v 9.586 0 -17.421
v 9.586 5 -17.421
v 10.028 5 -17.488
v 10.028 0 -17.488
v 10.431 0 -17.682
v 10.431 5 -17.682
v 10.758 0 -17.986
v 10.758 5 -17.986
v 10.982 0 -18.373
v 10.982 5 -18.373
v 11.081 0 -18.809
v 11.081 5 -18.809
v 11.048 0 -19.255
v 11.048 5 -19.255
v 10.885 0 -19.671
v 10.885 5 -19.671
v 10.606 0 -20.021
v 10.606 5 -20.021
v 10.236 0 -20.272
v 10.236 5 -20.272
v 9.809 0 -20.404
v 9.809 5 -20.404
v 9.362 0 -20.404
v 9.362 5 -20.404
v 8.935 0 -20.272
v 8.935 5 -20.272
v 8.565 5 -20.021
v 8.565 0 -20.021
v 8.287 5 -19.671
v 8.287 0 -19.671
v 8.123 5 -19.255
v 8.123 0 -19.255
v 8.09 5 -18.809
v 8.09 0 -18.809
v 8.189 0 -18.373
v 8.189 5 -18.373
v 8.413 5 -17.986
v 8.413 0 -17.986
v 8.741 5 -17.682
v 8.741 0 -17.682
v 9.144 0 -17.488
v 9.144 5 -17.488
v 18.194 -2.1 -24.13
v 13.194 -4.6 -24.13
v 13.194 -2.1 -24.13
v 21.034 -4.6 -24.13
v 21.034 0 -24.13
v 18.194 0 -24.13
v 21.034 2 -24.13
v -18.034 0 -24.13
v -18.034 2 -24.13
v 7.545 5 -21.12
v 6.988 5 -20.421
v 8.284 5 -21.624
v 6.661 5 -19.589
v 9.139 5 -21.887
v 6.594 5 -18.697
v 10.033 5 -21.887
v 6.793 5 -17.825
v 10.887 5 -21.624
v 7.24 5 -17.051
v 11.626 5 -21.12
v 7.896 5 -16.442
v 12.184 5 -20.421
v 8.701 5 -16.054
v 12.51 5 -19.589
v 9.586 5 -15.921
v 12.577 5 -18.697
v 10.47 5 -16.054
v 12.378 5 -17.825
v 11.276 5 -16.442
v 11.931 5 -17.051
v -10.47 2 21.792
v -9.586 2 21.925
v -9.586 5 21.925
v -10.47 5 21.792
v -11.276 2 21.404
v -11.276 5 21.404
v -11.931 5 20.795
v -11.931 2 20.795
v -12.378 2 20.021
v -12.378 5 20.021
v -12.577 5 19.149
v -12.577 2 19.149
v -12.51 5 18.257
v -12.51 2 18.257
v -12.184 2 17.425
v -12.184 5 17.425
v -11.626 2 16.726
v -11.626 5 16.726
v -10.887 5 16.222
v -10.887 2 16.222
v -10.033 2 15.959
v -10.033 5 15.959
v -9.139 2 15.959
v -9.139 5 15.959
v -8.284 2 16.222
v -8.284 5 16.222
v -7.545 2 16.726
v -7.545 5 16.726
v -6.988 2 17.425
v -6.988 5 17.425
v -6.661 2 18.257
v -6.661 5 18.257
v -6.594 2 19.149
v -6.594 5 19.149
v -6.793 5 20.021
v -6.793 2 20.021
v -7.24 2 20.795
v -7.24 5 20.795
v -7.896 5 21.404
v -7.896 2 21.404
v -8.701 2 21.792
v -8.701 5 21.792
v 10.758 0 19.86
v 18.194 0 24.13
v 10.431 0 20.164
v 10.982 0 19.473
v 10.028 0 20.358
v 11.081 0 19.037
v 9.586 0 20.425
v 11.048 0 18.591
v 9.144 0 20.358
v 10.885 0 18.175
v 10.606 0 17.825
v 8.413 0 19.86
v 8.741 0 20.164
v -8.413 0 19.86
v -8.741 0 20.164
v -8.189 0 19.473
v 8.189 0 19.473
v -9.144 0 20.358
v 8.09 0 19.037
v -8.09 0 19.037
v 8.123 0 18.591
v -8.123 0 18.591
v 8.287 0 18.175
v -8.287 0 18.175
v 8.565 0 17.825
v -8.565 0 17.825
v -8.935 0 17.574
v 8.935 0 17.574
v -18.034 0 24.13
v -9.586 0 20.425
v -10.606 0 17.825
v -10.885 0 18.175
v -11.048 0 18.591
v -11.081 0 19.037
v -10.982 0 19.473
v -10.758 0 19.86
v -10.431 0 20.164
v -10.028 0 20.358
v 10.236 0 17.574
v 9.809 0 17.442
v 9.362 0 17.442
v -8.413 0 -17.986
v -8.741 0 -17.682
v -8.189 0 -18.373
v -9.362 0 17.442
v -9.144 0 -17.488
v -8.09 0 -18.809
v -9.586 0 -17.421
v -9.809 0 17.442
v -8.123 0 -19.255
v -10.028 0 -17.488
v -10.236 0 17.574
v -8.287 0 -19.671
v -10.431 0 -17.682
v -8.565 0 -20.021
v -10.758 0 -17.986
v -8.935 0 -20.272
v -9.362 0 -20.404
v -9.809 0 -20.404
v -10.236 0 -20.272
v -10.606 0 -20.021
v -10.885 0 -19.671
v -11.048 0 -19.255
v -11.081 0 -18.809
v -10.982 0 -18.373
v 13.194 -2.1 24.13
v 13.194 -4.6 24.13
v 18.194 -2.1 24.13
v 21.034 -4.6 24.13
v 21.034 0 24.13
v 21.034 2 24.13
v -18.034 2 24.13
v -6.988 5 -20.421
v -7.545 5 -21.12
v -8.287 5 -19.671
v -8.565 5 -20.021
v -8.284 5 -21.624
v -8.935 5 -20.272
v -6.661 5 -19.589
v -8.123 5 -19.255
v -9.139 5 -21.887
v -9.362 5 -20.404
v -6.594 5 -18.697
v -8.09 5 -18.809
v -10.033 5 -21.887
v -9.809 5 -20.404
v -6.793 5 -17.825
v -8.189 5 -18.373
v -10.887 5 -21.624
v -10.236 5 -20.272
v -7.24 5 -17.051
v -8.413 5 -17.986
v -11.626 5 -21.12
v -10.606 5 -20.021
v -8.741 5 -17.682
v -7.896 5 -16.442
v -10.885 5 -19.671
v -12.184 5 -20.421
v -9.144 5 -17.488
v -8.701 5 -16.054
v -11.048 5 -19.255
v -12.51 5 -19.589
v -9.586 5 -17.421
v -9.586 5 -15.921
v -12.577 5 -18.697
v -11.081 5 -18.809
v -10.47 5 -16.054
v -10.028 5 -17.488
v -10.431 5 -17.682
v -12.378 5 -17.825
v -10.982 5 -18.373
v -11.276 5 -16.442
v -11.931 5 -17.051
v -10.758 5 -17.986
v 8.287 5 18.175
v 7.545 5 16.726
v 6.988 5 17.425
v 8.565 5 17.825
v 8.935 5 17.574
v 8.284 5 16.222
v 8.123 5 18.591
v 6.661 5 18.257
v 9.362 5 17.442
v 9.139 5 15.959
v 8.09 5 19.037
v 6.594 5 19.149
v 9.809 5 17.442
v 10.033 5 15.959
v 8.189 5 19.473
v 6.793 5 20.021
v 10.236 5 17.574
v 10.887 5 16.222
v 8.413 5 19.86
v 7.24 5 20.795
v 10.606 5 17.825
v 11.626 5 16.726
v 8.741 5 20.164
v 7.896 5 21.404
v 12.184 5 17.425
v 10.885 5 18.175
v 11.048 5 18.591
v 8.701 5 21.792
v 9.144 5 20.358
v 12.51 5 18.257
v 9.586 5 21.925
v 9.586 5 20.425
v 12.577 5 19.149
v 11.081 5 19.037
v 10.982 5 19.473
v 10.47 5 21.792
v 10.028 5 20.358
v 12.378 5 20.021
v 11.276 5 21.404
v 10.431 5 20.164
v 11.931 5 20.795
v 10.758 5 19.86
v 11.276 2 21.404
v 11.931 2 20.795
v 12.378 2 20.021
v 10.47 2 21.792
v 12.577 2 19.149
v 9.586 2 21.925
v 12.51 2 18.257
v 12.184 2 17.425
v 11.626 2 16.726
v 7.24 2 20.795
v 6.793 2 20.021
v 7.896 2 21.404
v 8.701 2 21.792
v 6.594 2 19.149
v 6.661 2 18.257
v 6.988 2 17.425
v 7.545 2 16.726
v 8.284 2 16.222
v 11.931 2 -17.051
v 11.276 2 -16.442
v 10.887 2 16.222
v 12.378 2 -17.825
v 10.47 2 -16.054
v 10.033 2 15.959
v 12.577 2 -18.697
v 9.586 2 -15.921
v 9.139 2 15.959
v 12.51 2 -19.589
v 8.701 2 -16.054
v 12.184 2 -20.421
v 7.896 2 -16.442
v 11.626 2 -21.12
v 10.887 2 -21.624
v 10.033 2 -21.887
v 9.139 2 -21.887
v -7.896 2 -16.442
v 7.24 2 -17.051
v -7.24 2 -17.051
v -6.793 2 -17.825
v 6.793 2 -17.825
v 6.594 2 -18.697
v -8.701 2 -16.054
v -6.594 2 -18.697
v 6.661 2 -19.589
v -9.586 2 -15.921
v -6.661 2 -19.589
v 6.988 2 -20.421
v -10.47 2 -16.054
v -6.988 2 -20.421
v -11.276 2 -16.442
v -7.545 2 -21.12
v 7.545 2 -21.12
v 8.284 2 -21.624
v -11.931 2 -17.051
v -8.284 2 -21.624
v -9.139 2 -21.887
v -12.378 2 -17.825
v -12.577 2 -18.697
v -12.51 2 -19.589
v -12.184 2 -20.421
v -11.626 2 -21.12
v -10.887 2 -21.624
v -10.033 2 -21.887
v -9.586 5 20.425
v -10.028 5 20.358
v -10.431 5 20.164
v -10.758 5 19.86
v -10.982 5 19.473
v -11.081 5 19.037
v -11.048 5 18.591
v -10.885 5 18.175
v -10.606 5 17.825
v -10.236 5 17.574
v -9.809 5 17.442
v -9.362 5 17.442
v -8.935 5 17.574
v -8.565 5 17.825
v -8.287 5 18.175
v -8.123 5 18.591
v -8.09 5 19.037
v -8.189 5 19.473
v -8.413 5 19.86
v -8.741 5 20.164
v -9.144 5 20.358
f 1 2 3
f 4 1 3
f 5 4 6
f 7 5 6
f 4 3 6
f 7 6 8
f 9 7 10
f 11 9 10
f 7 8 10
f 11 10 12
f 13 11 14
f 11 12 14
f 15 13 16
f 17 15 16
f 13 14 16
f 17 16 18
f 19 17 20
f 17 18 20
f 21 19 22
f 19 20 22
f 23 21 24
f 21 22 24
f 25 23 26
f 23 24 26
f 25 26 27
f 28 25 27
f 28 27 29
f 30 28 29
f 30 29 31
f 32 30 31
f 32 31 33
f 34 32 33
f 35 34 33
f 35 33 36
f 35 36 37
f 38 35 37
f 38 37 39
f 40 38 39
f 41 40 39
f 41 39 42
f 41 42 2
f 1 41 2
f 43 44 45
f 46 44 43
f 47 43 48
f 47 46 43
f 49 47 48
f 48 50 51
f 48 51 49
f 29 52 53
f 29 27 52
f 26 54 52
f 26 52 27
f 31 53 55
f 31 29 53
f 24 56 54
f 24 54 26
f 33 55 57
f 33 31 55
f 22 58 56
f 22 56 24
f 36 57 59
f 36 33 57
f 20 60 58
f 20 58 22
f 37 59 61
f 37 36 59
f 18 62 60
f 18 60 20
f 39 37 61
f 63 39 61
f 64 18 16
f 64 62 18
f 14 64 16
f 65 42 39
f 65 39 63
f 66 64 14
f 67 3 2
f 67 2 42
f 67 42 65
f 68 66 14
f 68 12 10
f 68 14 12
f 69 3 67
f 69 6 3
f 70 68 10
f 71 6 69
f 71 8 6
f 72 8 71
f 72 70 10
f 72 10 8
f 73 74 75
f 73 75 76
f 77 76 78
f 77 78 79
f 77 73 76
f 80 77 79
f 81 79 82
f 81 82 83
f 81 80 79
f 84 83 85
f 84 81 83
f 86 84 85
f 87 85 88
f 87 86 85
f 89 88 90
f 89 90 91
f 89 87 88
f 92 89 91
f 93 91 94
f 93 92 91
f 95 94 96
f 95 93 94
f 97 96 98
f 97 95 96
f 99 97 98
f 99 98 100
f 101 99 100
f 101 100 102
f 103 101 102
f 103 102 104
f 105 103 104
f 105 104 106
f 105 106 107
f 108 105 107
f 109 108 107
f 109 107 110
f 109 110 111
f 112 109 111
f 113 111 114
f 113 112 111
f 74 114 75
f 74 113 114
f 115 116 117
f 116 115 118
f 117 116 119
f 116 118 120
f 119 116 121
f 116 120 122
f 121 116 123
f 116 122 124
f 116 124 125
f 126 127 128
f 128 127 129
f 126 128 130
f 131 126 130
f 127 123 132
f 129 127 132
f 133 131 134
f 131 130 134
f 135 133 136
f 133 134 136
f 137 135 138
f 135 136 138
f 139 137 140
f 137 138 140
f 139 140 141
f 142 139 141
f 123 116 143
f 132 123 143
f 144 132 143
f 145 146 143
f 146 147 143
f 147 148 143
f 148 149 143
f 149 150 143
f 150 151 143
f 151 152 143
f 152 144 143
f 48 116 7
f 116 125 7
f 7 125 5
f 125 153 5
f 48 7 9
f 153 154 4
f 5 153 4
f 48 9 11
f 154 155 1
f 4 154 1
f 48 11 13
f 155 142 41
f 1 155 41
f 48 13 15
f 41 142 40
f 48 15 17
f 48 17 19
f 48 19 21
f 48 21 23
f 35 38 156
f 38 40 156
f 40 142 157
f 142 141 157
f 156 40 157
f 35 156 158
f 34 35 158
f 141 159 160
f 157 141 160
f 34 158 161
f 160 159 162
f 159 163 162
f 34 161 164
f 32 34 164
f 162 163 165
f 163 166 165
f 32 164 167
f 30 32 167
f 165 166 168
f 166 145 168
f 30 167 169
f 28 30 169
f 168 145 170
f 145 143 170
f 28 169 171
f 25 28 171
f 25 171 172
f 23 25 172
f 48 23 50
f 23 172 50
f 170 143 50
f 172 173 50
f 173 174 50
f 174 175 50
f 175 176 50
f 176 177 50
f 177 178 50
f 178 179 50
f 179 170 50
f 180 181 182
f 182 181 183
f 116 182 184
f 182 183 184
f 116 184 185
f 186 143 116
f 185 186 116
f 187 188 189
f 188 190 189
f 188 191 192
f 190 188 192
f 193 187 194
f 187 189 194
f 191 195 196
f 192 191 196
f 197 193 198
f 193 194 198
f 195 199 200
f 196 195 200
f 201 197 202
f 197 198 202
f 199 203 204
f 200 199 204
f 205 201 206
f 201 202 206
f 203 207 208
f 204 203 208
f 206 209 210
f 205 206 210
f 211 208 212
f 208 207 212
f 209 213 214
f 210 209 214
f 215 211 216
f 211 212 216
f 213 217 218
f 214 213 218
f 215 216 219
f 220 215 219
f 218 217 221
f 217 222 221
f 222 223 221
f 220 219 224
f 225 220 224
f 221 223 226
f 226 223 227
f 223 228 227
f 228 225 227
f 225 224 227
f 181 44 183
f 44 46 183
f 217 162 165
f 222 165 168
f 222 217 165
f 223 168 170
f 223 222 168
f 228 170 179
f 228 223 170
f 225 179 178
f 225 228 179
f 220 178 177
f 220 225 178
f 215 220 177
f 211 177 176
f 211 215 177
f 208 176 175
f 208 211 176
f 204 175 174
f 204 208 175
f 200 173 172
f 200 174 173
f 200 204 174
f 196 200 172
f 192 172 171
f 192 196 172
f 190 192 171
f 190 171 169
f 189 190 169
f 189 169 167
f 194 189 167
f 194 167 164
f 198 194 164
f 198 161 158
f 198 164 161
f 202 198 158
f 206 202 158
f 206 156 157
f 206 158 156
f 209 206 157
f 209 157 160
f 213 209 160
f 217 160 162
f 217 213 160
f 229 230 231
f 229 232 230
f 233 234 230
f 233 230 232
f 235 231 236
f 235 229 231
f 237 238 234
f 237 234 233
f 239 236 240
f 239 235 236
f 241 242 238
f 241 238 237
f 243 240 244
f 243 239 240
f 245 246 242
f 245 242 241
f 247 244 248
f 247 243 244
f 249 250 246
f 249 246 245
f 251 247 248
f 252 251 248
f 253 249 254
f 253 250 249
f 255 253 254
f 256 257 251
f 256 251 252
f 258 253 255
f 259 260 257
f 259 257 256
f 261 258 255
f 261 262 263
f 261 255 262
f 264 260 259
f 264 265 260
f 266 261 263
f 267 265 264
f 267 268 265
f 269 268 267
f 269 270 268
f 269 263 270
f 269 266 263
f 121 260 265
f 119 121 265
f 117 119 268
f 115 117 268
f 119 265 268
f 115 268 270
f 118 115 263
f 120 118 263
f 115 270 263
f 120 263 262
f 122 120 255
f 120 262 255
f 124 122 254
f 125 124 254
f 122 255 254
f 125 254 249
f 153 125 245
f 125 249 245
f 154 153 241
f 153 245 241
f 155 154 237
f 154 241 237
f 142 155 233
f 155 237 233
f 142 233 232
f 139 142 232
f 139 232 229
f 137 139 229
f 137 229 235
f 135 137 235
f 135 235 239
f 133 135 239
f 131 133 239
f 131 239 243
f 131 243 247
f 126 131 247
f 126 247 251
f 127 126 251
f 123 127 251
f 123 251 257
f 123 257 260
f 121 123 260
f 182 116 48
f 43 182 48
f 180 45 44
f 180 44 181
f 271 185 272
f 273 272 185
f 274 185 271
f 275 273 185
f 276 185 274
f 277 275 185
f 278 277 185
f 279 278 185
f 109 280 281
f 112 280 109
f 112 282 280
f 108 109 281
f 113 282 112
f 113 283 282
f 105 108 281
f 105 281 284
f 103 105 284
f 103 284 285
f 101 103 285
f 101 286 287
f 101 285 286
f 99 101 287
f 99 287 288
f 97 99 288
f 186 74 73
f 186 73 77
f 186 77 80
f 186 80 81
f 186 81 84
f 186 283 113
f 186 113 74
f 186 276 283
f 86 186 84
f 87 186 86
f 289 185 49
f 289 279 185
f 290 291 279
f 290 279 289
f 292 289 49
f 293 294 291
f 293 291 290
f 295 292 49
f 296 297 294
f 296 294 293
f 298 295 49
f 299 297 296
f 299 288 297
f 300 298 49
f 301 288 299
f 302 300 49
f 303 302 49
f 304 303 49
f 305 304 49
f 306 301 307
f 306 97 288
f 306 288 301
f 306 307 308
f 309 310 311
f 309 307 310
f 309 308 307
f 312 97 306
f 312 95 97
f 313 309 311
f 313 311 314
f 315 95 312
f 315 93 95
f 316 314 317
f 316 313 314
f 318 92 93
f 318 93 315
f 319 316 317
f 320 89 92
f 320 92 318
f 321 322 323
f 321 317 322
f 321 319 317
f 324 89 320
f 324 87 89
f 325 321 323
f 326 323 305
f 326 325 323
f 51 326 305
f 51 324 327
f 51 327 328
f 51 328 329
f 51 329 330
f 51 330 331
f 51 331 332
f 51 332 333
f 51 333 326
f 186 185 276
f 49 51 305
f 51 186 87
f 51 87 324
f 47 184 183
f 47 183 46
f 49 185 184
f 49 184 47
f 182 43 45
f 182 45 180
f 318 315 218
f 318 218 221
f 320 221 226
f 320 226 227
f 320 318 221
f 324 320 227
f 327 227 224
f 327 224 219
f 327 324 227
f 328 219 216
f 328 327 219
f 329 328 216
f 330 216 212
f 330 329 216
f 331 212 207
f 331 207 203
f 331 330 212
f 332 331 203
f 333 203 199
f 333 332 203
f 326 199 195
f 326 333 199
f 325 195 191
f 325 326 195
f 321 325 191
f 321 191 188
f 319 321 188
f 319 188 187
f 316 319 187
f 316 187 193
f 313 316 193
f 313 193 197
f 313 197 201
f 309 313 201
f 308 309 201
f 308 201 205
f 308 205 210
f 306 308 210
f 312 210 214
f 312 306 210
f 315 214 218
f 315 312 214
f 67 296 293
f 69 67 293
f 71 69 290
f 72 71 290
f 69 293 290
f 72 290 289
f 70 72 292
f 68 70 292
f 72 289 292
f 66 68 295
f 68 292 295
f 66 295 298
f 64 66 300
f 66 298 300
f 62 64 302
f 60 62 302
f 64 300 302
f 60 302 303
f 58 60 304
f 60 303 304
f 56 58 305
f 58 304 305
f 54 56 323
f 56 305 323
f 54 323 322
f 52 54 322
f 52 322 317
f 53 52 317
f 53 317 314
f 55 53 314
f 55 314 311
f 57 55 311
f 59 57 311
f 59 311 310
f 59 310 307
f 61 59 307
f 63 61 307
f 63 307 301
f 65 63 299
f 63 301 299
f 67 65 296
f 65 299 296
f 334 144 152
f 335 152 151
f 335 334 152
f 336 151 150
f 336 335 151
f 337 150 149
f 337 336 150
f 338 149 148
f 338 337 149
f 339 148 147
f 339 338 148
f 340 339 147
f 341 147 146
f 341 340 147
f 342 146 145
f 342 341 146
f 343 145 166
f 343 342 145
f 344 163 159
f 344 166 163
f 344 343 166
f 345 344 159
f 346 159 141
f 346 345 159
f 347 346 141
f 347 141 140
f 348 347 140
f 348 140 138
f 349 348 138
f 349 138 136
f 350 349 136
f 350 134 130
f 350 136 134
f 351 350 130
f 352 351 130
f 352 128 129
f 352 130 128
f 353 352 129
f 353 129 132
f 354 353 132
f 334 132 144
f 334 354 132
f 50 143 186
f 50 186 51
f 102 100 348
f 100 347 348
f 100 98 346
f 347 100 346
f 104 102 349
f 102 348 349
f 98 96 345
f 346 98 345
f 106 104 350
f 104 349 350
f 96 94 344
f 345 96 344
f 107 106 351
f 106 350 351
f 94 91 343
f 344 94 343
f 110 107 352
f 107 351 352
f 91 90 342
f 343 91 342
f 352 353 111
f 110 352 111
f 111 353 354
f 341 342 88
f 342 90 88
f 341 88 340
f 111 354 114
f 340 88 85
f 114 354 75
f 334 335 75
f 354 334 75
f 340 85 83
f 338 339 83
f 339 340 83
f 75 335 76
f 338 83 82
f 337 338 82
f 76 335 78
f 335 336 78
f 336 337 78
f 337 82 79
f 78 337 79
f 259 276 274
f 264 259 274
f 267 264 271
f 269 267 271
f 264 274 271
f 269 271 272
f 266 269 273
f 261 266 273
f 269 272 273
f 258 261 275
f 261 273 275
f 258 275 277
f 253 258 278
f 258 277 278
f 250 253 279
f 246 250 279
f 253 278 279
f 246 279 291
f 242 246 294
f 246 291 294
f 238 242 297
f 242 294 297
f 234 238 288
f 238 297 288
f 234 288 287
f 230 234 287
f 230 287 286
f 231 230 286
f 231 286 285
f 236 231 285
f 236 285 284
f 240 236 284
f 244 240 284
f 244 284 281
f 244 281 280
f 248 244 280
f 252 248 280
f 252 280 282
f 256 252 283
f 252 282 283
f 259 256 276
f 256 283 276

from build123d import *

# Parameters (mm, degrees)
ESQUISSE1_W             = 36.068
ESQUISSE1_H             = 48.26
BOSS_EXTRU_1_DEPTH      = 2
ESQUISSE4_R             = 3
BOSS_EXTRU_2_DEPTH      = 3
ESQUISSE6_R             = 1.5
ENL_V_MAT_EXTRU_1_DEPTH = 31.536569159
ESQUISSE10_W            = 48.26
ESQUISSE10_H            = 2
BOSS_EXTRU_3_DEPTH      = 3
ESQUISSE11_W            = 2.839594579
ESQUISSE11_H            = 48.26
BOSS_EXTRU_4_DEPTH      = 4.6
ESQUISSE12_W            = 48.26
ESQUISSE12_H            = 2.5
BOSS_EXTRU_5_DEPTH      = 5


with BuildPart() as part:
    # Esquisse1 → Boss.-Extru.1 (new body)
    with BuildSketch(Plane(origin=(0, 0, 0), x_dir=(1, 0, 0), z_dir=(0, 1, 0))):
        Rectangle(ESQUISSE1_W, ESQUISSE1_H)
    extrude(amount=BOSS_EXTRU_1_DEPTH)

    # Esquisse4 → Boss.-Extru.2 (add)
    with BuildSketch(Plane(origin=(0, 2, 0), x_dir=(1, 0, 0), z_dir=(0, 1, 0))):
        with Locations(Location((9.585669099, 18.921, 0), (0, 0, 270))):
            Circle(ESQUISSE4_R)
        with Locations(Location((9.585669099, -18.925, 0), (0, 0, 270))):
            Circle(ESQUISSE4_R)
    boss_extru_2 = extrude(amount=BOSS_EXTRU_2_DEPTH)

    # Esquisse6 → Enlèv. mat.-Extru.1 (cut, through all)
    with BuildSketch(Plane(origin=(0, 5, 0), x_dir=(1, 0, 0), z_dir=(0, 1, 0))):
        with Locations(Location((9.585669099, 18.921, 0), (0, 0, 270))):
            Circle(ESQUISSE6_R)
        with Locations(Location((9.585669099, -18.925, 0), (0, 0, 270))):
            Circle(ESQUISSE6_R)
    enl_v_mat_extru_1 = extrude(amount=-ENL_V_MAT_EXTRU_1_DEPTH, mode=Mode.SUBTRACT)

    # Symétrie1: Boss.-Extru.2, Enlèv. mat.-Extru.1 across plane
    add(boss_extru_2.mirror(Plane(origin=(0, 0, 0), x_dir=(0, 0, 1), z_dir=(1, 0, 0))))
    add(enl_v_mat_extru_1.mirror(Plane(origin=(0, 0, 0), x_dir=(0, 0, 1), z_dir=(1, 0, 0))), mode=Mode.SUBTRACT)

    # Esquisse10 → Boss.-Extru.3 (add)
    with BuildSketch(Plane(origin=(18.034, 0, 0), x_dir=(0, 0, -1), z_dir=(1, 0, 0))):
        with Locations((0, 1)):
            Rectangle(ESQUISSE10_W, ESQUISSE10_H)
    extrude(amount=BOSS_EXTRU_3_DEPTH)

    # Esquisse11 → Boss.-Extru.4 (add)
    with BuildSketch(Plane(origin=(0, 0, 0), x_dir=(-1, 0, 0), z_dir=(0, -1, 0))):
        with Locations((-19.614202711, 0)):
            Rectangle(ESQUISSE11_W, ESQUISSE11_H)
    extrude(amount=BOSS_EXTRU_4_DEPTH)

    # Esquisse12 → Boss.-Extru.5 (add)
    with BuildSketch(Plane.ZY.offset(-18.194405421)):
        with Locations((0, -3.35)):
            Rectangle(ESQUISSE12_W, ESQUISSE12_H)
    extrude(amount=BOSS_EXTRU_5_DEPTH)


solid = part.part
